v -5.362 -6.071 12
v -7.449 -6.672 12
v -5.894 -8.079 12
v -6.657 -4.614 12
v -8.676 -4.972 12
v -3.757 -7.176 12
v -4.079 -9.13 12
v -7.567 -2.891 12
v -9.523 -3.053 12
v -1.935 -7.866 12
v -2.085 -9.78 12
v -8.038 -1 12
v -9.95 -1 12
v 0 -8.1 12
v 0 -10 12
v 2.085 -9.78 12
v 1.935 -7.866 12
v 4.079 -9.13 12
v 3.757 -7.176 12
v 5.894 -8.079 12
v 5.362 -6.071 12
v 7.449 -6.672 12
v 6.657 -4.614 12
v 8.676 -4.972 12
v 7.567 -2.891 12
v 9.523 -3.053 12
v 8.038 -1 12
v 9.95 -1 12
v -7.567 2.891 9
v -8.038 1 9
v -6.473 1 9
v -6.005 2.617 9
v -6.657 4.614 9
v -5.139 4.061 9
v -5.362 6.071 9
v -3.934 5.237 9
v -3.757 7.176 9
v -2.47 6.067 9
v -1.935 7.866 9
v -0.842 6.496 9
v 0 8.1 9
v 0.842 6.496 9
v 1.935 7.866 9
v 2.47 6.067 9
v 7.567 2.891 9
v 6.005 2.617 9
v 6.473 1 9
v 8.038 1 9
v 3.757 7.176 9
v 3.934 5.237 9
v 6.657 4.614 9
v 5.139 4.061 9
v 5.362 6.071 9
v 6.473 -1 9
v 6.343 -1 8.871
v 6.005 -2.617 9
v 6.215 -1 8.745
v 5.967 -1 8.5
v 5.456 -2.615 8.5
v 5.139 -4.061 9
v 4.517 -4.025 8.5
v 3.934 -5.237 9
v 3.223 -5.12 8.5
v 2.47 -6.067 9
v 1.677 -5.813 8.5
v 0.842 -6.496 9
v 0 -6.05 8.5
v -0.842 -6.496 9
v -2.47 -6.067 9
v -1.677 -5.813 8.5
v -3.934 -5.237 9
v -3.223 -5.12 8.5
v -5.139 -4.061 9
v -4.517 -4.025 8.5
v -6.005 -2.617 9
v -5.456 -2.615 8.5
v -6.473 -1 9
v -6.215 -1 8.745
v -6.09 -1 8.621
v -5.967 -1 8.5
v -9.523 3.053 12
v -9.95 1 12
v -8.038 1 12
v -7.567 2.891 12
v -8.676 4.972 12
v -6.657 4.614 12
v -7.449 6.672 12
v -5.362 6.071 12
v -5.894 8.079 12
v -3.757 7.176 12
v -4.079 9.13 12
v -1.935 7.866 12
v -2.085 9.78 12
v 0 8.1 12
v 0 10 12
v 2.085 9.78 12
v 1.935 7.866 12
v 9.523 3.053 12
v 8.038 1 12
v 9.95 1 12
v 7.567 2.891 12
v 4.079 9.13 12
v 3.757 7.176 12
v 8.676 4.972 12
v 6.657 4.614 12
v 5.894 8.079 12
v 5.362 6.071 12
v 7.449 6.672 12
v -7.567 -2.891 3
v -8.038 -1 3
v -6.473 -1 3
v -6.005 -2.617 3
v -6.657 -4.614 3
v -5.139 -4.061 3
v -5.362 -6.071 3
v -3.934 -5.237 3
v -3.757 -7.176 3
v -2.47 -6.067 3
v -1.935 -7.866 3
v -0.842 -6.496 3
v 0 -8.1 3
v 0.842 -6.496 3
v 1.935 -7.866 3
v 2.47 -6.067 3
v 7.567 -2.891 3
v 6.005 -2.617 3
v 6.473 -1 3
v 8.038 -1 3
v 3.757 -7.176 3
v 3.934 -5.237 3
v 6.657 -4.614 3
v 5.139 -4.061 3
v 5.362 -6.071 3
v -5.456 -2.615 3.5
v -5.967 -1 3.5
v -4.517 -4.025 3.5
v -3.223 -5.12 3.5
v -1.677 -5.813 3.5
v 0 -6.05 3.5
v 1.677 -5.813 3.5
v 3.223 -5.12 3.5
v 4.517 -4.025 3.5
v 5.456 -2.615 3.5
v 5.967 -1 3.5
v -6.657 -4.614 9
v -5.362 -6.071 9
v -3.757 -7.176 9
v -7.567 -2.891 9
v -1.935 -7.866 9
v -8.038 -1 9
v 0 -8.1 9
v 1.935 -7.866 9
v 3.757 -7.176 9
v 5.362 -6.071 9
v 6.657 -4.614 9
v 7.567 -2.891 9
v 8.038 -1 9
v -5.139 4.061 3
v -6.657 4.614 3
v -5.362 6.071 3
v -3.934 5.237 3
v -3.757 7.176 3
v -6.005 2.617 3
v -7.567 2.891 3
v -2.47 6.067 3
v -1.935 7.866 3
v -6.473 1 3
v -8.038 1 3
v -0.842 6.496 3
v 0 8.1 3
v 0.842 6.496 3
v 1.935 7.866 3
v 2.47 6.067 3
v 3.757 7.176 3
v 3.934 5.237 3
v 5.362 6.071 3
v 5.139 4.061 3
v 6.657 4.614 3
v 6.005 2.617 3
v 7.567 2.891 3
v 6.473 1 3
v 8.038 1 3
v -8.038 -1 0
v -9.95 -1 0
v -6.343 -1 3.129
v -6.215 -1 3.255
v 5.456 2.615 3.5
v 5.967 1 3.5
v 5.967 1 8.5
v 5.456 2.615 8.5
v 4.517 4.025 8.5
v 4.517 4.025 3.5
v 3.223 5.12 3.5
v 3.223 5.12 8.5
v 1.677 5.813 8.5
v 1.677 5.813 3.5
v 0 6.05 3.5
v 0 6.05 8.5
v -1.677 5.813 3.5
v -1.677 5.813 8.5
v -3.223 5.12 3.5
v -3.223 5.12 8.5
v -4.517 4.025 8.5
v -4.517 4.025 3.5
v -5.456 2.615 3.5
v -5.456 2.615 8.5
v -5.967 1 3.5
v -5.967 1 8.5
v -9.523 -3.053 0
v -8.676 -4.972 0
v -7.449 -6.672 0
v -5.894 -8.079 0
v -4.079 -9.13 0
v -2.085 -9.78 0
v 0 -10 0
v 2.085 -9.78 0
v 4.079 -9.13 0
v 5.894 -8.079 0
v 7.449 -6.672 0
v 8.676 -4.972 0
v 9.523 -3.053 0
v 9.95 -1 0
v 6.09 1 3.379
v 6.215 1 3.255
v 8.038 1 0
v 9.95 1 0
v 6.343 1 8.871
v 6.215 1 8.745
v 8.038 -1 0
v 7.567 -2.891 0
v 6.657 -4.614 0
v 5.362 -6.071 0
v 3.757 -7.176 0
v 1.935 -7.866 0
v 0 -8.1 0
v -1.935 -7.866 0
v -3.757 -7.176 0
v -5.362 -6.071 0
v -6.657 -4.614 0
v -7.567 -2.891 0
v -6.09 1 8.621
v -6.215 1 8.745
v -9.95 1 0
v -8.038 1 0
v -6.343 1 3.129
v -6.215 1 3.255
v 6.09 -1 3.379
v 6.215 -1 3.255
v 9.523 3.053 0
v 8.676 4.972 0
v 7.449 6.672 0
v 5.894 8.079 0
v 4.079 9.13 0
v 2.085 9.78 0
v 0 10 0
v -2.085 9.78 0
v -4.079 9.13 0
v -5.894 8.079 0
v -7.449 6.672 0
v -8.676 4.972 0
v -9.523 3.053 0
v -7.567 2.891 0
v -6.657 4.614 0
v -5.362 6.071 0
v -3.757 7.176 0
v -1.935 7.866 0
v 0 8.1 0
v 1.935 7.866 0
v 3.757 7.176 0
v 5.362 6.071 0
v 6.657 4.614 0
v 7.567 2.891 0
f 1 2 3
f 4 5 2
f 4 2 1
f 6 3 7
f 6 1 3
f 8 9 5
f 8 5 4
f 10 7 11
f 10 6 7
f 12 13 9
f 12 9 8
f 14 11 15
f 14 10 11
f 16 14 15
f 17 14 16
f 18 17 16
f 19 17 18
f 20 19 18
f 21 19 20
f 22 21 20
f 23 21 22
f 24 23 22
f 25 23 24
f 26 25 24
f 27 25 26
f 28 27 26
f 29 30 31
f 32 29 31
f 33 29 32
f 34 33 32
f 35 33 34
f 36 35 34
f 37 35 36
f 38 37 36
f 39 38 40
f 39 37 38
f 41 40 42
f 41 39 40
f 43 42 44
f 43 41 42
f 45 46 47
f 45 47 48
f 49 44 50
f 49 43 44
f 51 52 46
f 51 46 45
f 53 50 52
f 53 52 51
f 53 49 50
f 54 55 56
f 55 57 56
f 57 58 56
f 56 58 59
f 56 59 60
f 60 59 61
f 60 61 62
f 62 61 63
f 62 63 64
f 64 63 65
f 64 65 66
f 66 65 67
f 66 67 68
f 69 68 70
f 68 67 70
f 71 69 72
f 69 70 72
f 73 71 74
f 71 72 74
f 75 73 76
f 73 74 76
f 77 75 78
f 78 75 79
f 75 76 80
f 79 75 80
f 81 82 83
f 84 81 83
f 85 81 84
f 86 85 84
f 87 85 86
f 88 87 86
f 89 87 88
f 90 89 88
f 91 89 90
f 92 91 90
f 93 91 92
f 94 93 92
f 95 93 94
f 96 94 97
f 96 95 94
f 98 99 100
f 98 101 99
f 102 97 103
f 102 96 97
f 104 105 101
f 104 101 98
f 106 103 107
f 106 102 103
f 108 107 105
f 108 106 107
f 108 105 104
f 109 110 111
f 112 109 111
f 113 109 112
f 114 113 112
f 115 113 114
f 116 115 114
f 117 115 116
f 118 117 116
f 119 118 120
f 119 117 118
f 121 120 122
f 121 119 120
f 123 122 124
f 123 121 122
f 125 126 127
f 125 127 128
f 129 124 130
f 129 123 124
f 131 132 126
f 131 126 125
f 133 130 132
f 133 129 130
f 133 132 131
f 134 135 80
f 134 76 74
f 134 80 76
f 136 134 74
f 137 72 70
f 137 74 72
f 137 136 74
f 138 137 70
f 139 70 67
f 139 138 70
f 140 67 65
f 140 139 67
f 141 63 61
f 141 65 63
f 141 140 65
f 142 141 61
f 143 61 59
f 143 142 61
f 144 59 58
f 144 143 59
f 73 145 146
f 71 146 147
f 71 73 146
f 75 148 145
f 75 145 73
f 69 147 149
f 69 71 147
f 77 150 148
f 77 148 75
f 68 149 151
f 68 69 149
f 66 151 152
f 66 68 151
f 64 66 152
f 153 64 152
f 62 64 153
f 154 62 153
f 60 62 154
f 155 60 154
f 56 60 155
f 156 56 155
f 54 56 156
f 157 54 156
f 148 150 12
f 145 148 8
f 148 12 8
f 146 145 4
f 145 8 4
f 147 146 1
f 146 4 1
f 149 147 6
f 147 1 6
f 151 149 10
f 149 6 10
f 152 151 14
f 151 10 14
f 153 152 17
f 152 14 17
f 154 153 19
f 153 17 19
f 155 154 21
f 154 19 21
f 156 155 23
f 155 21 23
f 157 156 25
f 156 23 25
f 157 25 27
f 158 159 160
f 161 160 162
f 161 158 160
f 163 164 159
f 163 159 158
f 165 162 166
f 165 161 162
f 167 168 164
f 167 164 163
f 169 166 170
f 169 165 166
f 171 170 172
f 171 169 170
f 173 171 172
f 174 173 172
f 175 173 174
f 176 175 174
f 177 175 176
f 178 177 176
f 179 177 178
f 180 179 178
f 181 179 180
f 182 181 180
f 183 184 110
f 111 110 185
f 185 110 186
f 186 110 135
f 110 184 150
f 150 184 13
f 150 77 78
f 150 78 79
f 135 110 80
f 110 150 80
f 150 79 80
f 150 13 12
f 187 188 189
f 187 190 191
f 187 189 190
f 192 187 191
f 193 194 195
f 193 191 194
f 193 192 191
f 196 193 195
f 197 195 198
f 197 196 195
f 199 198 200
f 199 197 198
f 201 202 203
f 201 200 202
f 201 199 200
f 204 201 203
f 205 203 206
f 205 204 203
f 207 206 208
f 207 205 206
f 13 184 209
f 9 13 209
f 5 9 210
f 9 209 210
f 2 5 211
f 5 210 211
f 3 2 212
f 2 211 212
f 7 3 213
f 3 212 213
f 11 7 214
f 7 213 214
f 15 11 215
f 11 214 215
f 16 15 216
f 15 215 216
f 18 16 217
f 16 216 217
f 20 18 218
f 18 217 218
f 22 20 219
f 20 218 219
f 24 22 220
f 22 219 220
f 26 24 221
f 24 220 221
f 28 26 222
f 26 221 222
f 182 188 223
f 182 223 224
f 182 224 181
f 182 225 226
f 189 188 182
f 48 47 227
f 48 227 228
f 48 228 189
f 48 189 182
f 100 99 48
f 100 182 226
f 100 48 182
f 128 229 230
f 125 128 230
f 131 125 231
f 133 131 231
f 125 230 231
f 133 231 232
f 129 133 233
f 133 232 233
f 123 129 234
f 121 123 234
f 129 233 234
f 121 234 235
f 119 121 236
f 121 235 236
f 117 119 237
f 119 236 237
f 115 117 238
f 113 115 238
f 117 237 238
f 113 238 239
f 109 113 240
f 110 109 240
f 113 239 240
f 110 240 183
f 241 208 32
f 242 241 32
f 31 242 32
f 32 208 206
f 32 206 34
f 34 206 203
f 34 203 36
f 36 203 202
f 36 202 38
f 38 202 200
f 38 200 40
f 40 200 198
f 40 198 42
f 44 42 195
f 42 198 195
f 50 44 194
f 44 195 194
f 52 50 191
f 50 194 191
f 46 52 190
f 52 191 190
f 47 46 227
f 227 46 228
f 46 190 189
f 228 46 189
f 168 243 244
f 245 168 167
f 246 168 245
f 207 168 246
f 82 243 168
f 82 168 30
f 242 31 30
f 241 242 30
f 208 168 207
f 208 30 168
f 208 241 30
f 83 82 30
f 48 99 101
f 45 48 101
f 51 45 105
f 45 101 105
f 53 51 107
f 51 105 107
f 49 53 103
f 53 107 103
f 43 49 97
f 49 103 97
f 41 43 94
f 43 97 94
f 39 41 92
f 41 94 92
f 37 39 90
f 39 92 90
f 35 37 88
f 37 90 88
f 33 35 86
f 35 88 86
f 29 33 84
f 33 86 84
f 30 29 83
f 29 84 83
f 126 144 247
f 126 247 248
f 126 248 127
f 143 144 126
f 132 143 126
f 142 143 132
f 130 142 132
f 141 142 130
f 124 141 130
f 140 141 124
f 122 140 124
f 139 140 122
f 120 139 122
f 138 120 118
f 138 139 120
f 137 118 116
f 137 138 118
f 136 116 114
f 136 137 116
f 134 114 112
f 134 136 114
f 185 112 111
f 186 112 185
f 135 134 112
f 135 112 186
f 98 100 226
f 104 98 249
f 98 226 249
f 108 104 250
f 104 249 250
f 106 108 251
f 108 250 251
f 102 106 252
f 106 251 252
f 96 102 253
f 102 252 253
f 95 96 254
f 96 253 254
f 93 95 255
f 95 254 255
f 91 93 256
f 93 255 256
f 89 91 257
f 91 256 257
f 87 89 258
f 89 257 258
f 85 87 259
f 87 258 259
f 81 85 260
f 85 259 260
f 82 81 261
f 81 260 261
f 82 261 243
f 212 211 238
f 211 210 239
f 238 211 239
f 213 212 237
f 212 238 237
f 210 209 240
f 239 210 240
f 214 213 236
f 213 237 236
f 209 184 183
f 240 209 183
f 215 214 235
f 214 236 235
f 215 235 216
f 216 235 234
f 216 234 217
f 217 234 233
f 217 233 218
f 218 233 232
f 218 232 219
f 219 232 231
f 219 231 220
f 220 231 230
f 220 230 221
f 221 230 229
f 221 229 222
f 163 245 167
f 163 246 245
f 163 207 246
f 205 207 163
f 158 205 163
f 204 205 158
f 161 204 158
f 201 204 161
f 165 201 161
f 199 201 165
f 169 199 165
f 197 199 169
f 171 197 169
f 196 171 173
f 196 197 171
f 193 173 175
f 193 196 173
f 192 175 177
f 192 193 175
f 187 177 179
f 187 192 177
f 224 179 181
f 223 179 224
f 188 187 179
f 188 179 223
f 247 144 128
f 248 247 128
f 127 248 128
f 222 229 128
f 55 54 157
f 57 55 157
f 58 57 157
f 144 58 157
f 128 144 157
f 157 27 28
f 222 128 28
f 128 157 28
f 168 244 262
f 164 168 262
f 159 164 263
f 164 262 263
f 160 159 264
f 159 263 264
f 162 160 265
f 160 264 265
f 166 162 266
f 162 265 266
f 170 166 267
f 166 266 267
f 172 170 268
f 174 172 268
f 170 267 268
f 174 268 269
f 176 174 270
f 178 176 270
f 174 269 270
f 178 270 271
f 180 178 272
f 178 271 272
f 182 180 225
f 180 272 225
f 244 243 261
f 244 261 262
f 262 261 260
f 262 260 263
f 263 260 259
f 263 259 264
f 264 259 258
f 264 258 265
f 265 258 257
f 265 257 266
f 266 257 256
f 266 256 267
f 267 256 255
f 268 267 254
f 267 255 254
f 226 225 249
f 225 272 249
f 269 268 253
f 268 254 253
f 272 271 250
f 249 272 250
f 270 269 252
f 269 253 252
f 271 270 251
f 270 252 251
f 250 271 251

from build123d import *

# Parameters (mm, degrees)
F0_R     = 10
F0_R_2   = 6.05
F1_DEPTH = 12
F2_R     = 8.1
F3_DEPTH = 3
F4_R     = 8.1
F5_DEPTH = 3
F6_SIZE  = 0.5
F7_W     = 24
F7_H     = 2
F8_DEPTH = 12.001


with BuildPart() as f1:
    # F0 (on Top) → F1 (new body)
    with BuildSketch(Plane.XY):
        Circle(F0_R)
        Circle(F0_R_2, mode=Mode.SUBTRACT)
    extrude(amount=F1_DEPTH)

    # F2 (on face) → F3 (cut)
    with BuildSketch(Plane(origin=(0, 0, 0), x_dir=(1, 0, 0), z_dir=(0, 0, -1))):
        Circle(F2_R)
    extrude(amount=-F3_DEPTH, mode=Mode.SUBTRACT)

    # F4 (on face) → F5 (cut)
    with BuildSketch(Plane.XY.offset(12)):
        Circle(F4_R)
    extrude(amount=-F5_DEPTH, mode=Mode.SUBTRACT)

    # F6
    f6_edges = [f1.edges().sort_by_distance(p)[0] for p in [
        (-6.05, 0, 9),
        (-6.05, 0, 3),
    ]]
    chamfer(f6_edges, length=F6_SIZE)

    # F7 (on face) → F8 (cut, through all)
    with BuildSketch(Plane.XY.offset(12)):
        Rectangle(F7_W, F7_H)
    extrude(amount=-F8_DEPTH, mode=Mode.SUBTRACT)


solid = f1.part
